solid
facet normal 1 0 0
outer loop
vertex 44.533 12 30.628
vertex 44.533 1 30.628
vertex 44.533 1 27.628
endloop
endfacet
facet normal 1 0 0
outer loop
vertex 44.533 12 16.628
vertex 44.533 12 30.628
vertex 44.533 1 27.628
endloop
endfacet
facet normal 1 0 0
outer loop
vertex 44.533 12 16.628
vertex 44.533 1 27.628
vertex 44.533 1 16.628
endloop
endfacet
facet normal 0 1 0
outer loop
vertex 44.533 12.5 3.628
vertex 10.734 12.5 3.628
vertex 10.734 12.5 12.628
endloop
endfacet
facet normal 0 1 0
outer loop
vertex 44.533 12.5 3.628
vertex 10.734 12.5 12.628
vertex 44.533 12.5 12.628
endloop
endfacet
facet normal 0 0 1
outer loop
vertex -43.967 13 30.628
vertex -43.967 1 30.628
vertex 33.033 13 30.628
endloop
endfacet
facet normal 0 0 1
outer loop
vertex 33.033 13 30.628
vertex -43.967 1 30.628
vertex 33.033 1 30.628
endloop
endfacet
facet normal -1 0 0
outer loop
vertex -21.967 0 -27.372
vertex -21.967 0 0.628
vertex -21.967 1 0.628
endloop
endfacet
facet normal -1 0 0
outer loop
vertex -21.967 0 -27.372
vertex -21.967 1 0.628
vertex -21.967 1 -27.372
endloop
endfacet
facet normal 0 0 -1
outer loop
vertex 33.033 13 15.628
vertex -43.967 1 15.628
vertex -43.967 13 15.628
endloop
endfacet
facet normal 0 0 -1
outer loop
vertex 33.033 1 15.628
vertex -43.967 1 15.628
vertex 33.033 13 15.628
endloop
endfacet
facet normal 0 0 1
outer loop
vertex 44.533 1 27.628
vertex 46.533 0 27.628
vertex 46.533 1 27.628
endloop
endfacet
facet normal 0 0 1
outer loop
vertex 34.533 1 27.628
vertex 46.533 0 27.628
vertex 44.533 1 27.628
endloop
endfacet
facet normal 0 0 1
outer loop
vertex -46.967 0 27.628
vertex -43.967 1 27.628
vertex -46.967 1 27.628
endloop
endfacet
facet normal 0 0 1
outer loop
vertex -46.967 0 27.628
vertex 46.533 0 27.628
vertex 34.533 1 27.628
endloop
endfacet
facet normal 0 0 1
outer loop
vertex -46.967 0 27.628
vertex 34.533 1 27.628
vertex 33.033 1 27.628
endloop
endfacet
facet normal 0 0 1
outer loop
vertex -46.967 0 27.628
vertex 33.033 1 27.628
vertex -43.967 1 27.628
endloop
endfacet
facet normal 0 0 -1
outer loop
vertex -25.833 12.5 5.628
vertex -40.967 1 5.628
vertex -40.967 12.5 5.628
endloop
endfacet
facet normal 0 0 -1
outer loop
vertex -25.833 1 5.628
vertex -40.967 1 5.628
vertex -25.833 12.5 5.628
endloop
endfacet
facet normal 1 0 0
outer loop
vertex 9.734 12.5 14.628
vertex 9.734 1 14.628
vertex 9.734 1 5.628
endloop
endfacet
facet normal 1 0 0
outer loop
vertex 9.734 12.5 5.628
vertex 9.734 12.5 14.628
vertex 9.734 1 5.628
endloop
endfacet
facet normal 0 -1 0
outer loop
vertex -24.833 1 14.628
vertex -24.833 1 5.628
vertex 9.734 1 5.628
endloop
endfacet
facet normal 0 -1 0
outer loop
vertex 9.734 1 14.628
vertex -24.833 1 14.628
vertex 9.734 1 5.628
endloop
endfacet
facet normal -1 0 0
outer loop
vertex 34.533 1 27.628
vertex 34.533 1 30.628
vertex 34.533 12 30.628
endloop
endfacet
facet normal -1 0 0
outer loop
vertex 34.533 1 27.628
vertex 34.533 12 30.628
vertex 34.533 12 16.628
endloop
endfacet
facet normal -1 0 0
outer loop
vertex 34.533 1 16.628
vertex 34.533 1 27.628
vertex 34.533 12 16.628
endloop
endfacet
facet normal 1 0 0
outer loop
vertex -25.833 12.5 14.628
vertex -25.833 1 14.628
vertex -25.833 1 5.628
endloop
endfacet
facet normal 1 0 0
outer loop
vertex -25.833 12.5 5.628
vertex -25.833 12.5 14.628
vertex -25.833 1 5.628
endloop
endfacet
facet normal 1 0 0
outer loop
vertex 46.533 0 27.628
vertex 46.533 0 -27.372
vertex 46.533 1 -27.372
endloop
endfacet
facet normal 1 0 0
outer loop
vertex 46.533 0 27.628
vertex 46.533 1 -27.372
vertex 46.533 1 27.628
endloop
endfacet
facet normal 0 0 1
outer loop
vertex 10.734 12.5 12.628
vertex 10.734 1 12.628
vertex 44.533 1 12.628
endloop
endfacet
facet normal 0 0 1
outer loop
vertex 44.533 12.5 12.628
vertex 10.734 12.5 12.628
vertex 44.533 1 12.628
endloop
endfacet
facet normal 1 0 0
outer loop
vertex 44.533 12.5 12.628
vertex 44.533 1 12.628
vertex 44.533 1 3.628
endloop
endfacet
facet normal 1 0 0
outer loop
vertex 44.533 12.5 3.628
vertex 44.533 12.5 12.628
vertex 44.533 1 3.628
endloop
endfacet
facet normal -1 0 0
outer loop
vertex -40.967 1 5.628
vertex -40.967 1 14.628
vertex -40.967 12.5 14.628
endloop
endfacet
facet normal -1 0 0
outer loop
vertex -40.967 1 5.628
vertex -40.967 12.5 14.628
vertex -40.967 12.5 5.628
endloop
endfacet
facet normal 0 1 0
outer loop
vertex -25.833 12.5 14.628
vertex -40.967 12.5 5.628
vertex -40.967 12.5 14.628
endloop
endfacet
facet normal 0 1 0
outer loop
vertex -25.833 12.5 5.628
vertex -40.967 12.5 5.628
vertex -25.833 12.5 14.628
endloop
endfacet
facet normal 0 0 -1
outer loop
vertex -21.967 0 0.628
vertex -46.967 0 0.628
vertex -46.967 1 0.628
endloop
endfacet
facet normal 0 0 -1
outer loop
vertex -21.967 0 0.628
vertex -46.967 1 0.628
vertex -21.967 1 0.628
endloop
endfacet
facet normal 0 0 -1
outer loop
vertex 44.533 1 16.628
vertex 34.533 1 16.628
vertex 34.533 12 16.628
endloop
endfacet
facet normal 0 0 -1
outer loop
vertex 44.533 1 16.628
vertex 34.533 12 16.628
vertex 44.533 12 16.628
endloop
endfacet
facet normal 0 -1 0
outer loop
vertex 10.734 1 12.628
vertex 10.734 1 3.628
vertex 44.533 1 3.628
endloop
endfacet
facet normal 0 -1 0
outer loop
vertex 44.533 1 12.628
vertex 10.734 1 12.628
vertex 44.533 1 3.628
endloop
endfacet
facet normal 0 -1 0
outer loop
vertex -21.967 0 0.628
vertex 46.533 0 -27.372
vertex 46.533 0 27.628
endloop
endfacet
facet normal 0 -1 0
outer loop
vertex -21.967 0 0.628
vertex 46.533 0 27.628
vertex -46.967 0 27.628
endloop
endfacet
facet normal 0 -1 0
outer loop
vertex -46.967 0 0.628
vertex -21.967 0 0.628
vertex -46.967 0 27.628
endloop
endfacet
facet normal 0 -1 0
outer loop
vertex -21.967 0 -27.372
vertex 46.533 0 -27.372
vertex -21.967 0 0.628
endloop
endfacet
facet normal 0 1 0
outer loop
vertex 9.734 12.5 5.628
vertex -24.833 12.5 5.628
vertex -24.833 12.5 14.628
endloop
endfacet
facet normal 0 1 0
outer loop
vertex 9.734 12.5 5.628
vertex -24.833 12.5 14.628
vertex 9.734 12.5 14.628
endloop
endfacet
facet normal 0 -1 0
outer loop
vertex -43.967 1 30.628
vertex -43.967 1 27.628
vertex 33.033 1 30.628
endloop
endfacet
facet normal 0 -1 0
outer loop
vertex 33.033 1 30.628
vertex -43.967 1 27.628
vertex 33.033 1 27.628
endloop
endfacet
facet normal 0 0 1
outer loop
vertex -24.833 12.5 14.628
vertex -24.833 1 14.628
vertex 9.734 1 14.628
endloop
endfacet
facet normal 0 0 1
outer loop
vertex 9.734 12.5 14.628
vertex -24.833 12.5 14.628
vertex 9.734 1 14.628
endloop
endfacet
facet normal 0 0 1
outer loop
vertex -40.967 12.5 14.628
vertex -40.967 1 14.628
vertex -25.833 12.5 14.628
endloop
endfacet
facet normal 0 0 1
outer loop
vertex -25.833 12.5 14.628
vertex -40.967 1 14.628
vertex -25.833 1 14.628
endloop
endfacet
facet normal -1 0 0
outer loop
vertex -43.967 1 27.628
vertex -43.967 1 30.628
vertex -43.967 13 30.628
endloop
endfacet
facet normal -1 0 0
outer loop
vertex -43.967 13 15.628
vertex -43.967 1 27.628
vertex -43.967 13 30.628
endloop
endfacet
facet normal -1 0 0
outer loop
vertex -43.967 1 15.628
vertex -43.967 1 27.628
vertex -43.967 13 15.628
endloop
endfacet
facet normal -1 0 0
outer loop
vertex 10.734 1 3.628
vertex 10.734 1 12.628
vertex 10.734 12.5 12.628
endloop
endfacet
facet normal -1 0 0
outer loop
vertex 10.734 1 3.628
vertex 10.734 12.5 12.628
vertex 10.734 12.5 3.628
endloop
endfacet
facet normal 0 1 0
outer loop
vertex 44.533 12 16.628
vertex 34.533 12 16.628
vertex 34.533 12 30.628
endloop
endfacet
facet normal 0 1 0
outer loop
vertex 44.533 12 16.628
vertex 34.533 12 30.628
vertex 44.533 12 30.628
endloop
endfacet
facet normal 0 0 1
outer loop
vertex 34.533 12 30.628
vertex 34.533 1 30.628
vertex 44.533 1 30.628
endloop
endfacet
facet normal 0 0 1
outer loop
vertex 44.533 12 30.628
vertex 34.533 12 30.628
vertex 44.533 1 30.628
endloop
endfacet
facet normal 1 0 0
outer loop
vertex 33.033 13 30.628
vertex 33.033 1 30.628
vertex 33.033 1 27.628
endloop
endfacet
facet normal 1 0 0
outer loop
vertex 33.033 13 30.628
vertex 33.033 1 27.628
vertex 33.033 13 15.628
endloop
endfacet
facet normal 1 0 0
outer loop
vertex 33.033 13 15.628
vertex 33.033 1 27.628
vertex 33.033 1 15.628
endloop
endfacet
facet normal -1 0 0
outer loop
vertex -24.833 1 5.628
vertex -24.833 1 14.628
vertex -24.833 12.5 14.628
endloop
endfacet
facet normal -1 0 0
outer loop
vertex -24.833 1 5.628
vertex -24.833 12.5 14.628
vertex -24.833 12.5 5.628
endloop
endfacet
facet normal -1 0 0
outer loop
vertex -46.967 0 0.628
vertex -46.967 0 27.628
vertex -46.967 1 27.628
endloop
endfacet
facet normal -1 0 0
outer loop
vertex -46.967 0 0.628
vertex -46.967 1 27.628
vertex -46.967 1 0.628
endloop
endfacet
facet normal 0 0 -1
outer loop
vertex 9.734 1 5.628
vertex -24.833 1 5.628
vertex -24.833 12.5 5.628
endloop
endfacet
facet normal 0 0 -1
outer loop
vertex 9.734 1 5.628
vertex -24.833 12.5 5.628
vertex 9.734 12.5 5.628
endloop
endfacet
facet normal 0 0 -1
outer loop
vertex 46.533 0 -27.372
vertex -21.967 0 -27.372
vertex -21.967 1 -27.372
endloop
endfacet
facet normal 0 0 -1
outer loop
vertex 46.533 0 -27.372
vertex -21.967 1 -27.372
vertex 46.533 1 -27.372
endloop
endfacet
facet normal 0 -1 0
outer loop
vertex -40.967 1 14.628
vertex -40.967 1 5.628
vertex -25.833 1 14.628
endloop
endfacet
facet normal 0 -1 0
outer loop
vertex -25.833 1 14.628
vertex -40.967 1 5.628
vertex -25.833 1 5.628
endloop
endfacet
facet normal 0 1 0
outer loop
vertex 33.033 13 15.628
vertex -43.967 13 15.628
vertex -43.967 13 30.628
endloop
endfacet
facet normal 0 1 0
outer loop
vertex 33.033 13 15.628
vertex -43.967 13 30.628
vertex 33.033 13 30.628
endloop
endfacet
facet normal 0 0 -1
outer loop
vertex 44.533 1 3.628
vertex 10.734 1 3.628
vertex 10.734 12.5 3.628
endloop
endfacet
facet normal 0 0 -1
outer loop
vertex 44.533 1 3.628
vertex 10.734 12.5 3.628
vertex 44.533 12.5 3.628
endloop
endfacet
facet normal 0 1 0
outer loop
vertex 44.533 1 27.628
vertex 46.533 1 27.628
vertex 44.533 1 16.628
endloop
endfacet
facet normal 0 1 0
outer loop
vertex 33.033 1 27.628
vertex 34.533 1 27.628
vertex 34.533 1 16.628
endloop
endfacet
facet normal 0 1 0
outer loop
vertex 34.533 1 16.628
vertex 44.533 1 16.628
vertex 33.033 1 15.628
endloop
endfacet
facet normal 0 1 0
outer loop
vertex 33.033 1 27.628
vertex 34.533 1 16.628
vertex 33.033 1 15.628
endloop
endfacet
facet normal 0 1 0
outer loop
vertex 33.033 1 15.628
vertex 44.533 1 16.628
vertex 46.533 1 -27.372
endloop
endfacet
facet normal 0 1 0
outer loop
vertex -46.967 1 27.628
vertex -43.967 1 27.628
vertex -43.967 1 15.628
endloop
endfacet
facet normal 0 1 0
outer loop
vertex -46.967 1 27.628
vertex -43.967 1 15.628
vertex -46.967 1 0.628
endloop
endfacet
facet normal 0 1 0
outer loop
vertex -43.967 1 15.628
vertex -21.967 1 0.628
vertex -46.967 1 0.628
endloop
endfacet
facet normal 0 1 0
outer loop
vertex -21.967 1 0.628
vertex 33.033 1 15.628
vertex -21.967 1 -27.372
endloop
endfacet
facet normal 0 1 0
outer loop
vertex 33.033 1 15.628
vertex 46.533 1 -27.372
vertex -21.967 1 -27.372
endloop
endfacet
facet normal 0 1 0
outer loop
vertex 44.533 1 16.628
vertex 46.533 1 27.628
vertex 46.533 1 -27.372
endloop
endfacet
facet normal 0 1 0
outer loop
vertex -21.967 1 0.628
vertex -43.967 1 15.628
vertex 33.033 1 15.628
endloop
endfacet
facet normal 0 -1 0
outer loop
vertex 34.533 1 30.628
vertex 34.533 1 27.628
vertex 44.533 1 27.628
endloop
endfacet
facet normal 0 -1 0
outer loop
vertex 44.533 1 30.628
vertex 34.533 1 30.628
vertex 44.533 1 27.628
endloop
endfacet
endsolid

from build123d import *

# Parameters (mm, degrees)
BOSS_EXTRUDE1_DEPTH   = 1
SKETCH2_W             = 77
SKETCH2_H             = 15
BOSS_EXTRUDE2_DEPTH   = 12
SKETCH3_W             = 10
SKETCH3_H             = 14
BOSS_EXTRUDE3_DEPTH   = 11
SKETCH4_W             = 15.133908349
SKETCH4_H             = 9
BOSS_EXTRUDE4_DEPTH   = 11.5
SKETCH4_W_2           = 34.567081878
BOSS_EXTRUDE4_2_DEPTH = 11.5
SKETCH4_W_3           = 33.799009773
BOSS_EXTRUDE4_3_DEPTH = 11.5


with BuildPart() as part:
    # Sketch1 → Boss-Extrude1 (new body)
    with BuildSketch(Plane(origin=(0, 0, 0), x_dir=(1, 0, 0), z_dir=(0, 1, 0))):
        Polygon((-46.9670263, -0.627662529), (-21.9670263, -0.627662529), (-21.9670263, 27.372337471), (46.5329737, 27.372337471), (46.5329737, -27.627662529), (-46.9670263, -27.627662529), align=None)
    extrude(amount=BOSS_EXTRUDE1_DEPTH)

    # Sketch2 → Boss-Extrude2 (add)
    with BuildSketch(Plane(origin=(0, 1, 0), x_dir=(1, 0, 0), z_dir=(0, 1, 0))):
        with Locations((-5.4670263, -23.127662529)):
            Rectangle(SKETCH2_W, SKETCH2_H)
    extrude(amount=BOSS_EXTRUDE2_DEPTH)

    # Sketch3 → Boss-Extrude3 (add)
    with BuildSketch(Plane(origin=(0, 1, 0), x_dir=(1, 0, 0), z_dir=(0, 1, 0))):
        with Locations((39.5329737, -23.627662529)):
            Rectangle(SKETCH3_W, SKETCH3_H)
    extrude(amount=BOSS_EXTRUDE3_DEPTH)


with BuildPart() as body_2:
    # Sketch4 → Boss-Extrude4 (new body)
    with BuildSketch(Plane(origin=(0, 1, 0), x_dir=(1, 0, 0), z_dir=(0, 1, 0))):
        with Locations((-33.400072126, -10.127662529)):
            Rectangle(SKETCH4_W, SKETCH4_H)
    extrude(amount=BOSS_EXTRUDE4_DEPTH)


with BuildPart() as body_3:
    # Sketch4 → Boss-Extrude4 2 (new body)
    with BuildSketch(Plane(origin=(0, 1, 0), x_dir=(1, 0, 0), z_dir=(0, 1, 0))):
        with Locations((-7.549577012, -10.127662529)):
            Rectangle(SKETCH4_W_2, SKETCH4_H)
    extrude(amount=BOSS_EXTRUDE4_2_DEPTH)


with BuildPart() as body_4:
    # Sketch4 → Boss-Extrude4 3 (new body)
    with BuildSketch(Plane(origin=(0, 1, 0), x_dir=(1, 0, 0), z_dir=(0, 1, 0))):
        with Locations((27.633468814, -8.127662529)):
            Rectangle(SKETCH4_W_3, SKETCH4_H)
    extrude(amount=BOSS_EXTRUDE4_3_DEPTH)


solid = Compound([part.part, body_2.part, body_3.part, body_4.part])
